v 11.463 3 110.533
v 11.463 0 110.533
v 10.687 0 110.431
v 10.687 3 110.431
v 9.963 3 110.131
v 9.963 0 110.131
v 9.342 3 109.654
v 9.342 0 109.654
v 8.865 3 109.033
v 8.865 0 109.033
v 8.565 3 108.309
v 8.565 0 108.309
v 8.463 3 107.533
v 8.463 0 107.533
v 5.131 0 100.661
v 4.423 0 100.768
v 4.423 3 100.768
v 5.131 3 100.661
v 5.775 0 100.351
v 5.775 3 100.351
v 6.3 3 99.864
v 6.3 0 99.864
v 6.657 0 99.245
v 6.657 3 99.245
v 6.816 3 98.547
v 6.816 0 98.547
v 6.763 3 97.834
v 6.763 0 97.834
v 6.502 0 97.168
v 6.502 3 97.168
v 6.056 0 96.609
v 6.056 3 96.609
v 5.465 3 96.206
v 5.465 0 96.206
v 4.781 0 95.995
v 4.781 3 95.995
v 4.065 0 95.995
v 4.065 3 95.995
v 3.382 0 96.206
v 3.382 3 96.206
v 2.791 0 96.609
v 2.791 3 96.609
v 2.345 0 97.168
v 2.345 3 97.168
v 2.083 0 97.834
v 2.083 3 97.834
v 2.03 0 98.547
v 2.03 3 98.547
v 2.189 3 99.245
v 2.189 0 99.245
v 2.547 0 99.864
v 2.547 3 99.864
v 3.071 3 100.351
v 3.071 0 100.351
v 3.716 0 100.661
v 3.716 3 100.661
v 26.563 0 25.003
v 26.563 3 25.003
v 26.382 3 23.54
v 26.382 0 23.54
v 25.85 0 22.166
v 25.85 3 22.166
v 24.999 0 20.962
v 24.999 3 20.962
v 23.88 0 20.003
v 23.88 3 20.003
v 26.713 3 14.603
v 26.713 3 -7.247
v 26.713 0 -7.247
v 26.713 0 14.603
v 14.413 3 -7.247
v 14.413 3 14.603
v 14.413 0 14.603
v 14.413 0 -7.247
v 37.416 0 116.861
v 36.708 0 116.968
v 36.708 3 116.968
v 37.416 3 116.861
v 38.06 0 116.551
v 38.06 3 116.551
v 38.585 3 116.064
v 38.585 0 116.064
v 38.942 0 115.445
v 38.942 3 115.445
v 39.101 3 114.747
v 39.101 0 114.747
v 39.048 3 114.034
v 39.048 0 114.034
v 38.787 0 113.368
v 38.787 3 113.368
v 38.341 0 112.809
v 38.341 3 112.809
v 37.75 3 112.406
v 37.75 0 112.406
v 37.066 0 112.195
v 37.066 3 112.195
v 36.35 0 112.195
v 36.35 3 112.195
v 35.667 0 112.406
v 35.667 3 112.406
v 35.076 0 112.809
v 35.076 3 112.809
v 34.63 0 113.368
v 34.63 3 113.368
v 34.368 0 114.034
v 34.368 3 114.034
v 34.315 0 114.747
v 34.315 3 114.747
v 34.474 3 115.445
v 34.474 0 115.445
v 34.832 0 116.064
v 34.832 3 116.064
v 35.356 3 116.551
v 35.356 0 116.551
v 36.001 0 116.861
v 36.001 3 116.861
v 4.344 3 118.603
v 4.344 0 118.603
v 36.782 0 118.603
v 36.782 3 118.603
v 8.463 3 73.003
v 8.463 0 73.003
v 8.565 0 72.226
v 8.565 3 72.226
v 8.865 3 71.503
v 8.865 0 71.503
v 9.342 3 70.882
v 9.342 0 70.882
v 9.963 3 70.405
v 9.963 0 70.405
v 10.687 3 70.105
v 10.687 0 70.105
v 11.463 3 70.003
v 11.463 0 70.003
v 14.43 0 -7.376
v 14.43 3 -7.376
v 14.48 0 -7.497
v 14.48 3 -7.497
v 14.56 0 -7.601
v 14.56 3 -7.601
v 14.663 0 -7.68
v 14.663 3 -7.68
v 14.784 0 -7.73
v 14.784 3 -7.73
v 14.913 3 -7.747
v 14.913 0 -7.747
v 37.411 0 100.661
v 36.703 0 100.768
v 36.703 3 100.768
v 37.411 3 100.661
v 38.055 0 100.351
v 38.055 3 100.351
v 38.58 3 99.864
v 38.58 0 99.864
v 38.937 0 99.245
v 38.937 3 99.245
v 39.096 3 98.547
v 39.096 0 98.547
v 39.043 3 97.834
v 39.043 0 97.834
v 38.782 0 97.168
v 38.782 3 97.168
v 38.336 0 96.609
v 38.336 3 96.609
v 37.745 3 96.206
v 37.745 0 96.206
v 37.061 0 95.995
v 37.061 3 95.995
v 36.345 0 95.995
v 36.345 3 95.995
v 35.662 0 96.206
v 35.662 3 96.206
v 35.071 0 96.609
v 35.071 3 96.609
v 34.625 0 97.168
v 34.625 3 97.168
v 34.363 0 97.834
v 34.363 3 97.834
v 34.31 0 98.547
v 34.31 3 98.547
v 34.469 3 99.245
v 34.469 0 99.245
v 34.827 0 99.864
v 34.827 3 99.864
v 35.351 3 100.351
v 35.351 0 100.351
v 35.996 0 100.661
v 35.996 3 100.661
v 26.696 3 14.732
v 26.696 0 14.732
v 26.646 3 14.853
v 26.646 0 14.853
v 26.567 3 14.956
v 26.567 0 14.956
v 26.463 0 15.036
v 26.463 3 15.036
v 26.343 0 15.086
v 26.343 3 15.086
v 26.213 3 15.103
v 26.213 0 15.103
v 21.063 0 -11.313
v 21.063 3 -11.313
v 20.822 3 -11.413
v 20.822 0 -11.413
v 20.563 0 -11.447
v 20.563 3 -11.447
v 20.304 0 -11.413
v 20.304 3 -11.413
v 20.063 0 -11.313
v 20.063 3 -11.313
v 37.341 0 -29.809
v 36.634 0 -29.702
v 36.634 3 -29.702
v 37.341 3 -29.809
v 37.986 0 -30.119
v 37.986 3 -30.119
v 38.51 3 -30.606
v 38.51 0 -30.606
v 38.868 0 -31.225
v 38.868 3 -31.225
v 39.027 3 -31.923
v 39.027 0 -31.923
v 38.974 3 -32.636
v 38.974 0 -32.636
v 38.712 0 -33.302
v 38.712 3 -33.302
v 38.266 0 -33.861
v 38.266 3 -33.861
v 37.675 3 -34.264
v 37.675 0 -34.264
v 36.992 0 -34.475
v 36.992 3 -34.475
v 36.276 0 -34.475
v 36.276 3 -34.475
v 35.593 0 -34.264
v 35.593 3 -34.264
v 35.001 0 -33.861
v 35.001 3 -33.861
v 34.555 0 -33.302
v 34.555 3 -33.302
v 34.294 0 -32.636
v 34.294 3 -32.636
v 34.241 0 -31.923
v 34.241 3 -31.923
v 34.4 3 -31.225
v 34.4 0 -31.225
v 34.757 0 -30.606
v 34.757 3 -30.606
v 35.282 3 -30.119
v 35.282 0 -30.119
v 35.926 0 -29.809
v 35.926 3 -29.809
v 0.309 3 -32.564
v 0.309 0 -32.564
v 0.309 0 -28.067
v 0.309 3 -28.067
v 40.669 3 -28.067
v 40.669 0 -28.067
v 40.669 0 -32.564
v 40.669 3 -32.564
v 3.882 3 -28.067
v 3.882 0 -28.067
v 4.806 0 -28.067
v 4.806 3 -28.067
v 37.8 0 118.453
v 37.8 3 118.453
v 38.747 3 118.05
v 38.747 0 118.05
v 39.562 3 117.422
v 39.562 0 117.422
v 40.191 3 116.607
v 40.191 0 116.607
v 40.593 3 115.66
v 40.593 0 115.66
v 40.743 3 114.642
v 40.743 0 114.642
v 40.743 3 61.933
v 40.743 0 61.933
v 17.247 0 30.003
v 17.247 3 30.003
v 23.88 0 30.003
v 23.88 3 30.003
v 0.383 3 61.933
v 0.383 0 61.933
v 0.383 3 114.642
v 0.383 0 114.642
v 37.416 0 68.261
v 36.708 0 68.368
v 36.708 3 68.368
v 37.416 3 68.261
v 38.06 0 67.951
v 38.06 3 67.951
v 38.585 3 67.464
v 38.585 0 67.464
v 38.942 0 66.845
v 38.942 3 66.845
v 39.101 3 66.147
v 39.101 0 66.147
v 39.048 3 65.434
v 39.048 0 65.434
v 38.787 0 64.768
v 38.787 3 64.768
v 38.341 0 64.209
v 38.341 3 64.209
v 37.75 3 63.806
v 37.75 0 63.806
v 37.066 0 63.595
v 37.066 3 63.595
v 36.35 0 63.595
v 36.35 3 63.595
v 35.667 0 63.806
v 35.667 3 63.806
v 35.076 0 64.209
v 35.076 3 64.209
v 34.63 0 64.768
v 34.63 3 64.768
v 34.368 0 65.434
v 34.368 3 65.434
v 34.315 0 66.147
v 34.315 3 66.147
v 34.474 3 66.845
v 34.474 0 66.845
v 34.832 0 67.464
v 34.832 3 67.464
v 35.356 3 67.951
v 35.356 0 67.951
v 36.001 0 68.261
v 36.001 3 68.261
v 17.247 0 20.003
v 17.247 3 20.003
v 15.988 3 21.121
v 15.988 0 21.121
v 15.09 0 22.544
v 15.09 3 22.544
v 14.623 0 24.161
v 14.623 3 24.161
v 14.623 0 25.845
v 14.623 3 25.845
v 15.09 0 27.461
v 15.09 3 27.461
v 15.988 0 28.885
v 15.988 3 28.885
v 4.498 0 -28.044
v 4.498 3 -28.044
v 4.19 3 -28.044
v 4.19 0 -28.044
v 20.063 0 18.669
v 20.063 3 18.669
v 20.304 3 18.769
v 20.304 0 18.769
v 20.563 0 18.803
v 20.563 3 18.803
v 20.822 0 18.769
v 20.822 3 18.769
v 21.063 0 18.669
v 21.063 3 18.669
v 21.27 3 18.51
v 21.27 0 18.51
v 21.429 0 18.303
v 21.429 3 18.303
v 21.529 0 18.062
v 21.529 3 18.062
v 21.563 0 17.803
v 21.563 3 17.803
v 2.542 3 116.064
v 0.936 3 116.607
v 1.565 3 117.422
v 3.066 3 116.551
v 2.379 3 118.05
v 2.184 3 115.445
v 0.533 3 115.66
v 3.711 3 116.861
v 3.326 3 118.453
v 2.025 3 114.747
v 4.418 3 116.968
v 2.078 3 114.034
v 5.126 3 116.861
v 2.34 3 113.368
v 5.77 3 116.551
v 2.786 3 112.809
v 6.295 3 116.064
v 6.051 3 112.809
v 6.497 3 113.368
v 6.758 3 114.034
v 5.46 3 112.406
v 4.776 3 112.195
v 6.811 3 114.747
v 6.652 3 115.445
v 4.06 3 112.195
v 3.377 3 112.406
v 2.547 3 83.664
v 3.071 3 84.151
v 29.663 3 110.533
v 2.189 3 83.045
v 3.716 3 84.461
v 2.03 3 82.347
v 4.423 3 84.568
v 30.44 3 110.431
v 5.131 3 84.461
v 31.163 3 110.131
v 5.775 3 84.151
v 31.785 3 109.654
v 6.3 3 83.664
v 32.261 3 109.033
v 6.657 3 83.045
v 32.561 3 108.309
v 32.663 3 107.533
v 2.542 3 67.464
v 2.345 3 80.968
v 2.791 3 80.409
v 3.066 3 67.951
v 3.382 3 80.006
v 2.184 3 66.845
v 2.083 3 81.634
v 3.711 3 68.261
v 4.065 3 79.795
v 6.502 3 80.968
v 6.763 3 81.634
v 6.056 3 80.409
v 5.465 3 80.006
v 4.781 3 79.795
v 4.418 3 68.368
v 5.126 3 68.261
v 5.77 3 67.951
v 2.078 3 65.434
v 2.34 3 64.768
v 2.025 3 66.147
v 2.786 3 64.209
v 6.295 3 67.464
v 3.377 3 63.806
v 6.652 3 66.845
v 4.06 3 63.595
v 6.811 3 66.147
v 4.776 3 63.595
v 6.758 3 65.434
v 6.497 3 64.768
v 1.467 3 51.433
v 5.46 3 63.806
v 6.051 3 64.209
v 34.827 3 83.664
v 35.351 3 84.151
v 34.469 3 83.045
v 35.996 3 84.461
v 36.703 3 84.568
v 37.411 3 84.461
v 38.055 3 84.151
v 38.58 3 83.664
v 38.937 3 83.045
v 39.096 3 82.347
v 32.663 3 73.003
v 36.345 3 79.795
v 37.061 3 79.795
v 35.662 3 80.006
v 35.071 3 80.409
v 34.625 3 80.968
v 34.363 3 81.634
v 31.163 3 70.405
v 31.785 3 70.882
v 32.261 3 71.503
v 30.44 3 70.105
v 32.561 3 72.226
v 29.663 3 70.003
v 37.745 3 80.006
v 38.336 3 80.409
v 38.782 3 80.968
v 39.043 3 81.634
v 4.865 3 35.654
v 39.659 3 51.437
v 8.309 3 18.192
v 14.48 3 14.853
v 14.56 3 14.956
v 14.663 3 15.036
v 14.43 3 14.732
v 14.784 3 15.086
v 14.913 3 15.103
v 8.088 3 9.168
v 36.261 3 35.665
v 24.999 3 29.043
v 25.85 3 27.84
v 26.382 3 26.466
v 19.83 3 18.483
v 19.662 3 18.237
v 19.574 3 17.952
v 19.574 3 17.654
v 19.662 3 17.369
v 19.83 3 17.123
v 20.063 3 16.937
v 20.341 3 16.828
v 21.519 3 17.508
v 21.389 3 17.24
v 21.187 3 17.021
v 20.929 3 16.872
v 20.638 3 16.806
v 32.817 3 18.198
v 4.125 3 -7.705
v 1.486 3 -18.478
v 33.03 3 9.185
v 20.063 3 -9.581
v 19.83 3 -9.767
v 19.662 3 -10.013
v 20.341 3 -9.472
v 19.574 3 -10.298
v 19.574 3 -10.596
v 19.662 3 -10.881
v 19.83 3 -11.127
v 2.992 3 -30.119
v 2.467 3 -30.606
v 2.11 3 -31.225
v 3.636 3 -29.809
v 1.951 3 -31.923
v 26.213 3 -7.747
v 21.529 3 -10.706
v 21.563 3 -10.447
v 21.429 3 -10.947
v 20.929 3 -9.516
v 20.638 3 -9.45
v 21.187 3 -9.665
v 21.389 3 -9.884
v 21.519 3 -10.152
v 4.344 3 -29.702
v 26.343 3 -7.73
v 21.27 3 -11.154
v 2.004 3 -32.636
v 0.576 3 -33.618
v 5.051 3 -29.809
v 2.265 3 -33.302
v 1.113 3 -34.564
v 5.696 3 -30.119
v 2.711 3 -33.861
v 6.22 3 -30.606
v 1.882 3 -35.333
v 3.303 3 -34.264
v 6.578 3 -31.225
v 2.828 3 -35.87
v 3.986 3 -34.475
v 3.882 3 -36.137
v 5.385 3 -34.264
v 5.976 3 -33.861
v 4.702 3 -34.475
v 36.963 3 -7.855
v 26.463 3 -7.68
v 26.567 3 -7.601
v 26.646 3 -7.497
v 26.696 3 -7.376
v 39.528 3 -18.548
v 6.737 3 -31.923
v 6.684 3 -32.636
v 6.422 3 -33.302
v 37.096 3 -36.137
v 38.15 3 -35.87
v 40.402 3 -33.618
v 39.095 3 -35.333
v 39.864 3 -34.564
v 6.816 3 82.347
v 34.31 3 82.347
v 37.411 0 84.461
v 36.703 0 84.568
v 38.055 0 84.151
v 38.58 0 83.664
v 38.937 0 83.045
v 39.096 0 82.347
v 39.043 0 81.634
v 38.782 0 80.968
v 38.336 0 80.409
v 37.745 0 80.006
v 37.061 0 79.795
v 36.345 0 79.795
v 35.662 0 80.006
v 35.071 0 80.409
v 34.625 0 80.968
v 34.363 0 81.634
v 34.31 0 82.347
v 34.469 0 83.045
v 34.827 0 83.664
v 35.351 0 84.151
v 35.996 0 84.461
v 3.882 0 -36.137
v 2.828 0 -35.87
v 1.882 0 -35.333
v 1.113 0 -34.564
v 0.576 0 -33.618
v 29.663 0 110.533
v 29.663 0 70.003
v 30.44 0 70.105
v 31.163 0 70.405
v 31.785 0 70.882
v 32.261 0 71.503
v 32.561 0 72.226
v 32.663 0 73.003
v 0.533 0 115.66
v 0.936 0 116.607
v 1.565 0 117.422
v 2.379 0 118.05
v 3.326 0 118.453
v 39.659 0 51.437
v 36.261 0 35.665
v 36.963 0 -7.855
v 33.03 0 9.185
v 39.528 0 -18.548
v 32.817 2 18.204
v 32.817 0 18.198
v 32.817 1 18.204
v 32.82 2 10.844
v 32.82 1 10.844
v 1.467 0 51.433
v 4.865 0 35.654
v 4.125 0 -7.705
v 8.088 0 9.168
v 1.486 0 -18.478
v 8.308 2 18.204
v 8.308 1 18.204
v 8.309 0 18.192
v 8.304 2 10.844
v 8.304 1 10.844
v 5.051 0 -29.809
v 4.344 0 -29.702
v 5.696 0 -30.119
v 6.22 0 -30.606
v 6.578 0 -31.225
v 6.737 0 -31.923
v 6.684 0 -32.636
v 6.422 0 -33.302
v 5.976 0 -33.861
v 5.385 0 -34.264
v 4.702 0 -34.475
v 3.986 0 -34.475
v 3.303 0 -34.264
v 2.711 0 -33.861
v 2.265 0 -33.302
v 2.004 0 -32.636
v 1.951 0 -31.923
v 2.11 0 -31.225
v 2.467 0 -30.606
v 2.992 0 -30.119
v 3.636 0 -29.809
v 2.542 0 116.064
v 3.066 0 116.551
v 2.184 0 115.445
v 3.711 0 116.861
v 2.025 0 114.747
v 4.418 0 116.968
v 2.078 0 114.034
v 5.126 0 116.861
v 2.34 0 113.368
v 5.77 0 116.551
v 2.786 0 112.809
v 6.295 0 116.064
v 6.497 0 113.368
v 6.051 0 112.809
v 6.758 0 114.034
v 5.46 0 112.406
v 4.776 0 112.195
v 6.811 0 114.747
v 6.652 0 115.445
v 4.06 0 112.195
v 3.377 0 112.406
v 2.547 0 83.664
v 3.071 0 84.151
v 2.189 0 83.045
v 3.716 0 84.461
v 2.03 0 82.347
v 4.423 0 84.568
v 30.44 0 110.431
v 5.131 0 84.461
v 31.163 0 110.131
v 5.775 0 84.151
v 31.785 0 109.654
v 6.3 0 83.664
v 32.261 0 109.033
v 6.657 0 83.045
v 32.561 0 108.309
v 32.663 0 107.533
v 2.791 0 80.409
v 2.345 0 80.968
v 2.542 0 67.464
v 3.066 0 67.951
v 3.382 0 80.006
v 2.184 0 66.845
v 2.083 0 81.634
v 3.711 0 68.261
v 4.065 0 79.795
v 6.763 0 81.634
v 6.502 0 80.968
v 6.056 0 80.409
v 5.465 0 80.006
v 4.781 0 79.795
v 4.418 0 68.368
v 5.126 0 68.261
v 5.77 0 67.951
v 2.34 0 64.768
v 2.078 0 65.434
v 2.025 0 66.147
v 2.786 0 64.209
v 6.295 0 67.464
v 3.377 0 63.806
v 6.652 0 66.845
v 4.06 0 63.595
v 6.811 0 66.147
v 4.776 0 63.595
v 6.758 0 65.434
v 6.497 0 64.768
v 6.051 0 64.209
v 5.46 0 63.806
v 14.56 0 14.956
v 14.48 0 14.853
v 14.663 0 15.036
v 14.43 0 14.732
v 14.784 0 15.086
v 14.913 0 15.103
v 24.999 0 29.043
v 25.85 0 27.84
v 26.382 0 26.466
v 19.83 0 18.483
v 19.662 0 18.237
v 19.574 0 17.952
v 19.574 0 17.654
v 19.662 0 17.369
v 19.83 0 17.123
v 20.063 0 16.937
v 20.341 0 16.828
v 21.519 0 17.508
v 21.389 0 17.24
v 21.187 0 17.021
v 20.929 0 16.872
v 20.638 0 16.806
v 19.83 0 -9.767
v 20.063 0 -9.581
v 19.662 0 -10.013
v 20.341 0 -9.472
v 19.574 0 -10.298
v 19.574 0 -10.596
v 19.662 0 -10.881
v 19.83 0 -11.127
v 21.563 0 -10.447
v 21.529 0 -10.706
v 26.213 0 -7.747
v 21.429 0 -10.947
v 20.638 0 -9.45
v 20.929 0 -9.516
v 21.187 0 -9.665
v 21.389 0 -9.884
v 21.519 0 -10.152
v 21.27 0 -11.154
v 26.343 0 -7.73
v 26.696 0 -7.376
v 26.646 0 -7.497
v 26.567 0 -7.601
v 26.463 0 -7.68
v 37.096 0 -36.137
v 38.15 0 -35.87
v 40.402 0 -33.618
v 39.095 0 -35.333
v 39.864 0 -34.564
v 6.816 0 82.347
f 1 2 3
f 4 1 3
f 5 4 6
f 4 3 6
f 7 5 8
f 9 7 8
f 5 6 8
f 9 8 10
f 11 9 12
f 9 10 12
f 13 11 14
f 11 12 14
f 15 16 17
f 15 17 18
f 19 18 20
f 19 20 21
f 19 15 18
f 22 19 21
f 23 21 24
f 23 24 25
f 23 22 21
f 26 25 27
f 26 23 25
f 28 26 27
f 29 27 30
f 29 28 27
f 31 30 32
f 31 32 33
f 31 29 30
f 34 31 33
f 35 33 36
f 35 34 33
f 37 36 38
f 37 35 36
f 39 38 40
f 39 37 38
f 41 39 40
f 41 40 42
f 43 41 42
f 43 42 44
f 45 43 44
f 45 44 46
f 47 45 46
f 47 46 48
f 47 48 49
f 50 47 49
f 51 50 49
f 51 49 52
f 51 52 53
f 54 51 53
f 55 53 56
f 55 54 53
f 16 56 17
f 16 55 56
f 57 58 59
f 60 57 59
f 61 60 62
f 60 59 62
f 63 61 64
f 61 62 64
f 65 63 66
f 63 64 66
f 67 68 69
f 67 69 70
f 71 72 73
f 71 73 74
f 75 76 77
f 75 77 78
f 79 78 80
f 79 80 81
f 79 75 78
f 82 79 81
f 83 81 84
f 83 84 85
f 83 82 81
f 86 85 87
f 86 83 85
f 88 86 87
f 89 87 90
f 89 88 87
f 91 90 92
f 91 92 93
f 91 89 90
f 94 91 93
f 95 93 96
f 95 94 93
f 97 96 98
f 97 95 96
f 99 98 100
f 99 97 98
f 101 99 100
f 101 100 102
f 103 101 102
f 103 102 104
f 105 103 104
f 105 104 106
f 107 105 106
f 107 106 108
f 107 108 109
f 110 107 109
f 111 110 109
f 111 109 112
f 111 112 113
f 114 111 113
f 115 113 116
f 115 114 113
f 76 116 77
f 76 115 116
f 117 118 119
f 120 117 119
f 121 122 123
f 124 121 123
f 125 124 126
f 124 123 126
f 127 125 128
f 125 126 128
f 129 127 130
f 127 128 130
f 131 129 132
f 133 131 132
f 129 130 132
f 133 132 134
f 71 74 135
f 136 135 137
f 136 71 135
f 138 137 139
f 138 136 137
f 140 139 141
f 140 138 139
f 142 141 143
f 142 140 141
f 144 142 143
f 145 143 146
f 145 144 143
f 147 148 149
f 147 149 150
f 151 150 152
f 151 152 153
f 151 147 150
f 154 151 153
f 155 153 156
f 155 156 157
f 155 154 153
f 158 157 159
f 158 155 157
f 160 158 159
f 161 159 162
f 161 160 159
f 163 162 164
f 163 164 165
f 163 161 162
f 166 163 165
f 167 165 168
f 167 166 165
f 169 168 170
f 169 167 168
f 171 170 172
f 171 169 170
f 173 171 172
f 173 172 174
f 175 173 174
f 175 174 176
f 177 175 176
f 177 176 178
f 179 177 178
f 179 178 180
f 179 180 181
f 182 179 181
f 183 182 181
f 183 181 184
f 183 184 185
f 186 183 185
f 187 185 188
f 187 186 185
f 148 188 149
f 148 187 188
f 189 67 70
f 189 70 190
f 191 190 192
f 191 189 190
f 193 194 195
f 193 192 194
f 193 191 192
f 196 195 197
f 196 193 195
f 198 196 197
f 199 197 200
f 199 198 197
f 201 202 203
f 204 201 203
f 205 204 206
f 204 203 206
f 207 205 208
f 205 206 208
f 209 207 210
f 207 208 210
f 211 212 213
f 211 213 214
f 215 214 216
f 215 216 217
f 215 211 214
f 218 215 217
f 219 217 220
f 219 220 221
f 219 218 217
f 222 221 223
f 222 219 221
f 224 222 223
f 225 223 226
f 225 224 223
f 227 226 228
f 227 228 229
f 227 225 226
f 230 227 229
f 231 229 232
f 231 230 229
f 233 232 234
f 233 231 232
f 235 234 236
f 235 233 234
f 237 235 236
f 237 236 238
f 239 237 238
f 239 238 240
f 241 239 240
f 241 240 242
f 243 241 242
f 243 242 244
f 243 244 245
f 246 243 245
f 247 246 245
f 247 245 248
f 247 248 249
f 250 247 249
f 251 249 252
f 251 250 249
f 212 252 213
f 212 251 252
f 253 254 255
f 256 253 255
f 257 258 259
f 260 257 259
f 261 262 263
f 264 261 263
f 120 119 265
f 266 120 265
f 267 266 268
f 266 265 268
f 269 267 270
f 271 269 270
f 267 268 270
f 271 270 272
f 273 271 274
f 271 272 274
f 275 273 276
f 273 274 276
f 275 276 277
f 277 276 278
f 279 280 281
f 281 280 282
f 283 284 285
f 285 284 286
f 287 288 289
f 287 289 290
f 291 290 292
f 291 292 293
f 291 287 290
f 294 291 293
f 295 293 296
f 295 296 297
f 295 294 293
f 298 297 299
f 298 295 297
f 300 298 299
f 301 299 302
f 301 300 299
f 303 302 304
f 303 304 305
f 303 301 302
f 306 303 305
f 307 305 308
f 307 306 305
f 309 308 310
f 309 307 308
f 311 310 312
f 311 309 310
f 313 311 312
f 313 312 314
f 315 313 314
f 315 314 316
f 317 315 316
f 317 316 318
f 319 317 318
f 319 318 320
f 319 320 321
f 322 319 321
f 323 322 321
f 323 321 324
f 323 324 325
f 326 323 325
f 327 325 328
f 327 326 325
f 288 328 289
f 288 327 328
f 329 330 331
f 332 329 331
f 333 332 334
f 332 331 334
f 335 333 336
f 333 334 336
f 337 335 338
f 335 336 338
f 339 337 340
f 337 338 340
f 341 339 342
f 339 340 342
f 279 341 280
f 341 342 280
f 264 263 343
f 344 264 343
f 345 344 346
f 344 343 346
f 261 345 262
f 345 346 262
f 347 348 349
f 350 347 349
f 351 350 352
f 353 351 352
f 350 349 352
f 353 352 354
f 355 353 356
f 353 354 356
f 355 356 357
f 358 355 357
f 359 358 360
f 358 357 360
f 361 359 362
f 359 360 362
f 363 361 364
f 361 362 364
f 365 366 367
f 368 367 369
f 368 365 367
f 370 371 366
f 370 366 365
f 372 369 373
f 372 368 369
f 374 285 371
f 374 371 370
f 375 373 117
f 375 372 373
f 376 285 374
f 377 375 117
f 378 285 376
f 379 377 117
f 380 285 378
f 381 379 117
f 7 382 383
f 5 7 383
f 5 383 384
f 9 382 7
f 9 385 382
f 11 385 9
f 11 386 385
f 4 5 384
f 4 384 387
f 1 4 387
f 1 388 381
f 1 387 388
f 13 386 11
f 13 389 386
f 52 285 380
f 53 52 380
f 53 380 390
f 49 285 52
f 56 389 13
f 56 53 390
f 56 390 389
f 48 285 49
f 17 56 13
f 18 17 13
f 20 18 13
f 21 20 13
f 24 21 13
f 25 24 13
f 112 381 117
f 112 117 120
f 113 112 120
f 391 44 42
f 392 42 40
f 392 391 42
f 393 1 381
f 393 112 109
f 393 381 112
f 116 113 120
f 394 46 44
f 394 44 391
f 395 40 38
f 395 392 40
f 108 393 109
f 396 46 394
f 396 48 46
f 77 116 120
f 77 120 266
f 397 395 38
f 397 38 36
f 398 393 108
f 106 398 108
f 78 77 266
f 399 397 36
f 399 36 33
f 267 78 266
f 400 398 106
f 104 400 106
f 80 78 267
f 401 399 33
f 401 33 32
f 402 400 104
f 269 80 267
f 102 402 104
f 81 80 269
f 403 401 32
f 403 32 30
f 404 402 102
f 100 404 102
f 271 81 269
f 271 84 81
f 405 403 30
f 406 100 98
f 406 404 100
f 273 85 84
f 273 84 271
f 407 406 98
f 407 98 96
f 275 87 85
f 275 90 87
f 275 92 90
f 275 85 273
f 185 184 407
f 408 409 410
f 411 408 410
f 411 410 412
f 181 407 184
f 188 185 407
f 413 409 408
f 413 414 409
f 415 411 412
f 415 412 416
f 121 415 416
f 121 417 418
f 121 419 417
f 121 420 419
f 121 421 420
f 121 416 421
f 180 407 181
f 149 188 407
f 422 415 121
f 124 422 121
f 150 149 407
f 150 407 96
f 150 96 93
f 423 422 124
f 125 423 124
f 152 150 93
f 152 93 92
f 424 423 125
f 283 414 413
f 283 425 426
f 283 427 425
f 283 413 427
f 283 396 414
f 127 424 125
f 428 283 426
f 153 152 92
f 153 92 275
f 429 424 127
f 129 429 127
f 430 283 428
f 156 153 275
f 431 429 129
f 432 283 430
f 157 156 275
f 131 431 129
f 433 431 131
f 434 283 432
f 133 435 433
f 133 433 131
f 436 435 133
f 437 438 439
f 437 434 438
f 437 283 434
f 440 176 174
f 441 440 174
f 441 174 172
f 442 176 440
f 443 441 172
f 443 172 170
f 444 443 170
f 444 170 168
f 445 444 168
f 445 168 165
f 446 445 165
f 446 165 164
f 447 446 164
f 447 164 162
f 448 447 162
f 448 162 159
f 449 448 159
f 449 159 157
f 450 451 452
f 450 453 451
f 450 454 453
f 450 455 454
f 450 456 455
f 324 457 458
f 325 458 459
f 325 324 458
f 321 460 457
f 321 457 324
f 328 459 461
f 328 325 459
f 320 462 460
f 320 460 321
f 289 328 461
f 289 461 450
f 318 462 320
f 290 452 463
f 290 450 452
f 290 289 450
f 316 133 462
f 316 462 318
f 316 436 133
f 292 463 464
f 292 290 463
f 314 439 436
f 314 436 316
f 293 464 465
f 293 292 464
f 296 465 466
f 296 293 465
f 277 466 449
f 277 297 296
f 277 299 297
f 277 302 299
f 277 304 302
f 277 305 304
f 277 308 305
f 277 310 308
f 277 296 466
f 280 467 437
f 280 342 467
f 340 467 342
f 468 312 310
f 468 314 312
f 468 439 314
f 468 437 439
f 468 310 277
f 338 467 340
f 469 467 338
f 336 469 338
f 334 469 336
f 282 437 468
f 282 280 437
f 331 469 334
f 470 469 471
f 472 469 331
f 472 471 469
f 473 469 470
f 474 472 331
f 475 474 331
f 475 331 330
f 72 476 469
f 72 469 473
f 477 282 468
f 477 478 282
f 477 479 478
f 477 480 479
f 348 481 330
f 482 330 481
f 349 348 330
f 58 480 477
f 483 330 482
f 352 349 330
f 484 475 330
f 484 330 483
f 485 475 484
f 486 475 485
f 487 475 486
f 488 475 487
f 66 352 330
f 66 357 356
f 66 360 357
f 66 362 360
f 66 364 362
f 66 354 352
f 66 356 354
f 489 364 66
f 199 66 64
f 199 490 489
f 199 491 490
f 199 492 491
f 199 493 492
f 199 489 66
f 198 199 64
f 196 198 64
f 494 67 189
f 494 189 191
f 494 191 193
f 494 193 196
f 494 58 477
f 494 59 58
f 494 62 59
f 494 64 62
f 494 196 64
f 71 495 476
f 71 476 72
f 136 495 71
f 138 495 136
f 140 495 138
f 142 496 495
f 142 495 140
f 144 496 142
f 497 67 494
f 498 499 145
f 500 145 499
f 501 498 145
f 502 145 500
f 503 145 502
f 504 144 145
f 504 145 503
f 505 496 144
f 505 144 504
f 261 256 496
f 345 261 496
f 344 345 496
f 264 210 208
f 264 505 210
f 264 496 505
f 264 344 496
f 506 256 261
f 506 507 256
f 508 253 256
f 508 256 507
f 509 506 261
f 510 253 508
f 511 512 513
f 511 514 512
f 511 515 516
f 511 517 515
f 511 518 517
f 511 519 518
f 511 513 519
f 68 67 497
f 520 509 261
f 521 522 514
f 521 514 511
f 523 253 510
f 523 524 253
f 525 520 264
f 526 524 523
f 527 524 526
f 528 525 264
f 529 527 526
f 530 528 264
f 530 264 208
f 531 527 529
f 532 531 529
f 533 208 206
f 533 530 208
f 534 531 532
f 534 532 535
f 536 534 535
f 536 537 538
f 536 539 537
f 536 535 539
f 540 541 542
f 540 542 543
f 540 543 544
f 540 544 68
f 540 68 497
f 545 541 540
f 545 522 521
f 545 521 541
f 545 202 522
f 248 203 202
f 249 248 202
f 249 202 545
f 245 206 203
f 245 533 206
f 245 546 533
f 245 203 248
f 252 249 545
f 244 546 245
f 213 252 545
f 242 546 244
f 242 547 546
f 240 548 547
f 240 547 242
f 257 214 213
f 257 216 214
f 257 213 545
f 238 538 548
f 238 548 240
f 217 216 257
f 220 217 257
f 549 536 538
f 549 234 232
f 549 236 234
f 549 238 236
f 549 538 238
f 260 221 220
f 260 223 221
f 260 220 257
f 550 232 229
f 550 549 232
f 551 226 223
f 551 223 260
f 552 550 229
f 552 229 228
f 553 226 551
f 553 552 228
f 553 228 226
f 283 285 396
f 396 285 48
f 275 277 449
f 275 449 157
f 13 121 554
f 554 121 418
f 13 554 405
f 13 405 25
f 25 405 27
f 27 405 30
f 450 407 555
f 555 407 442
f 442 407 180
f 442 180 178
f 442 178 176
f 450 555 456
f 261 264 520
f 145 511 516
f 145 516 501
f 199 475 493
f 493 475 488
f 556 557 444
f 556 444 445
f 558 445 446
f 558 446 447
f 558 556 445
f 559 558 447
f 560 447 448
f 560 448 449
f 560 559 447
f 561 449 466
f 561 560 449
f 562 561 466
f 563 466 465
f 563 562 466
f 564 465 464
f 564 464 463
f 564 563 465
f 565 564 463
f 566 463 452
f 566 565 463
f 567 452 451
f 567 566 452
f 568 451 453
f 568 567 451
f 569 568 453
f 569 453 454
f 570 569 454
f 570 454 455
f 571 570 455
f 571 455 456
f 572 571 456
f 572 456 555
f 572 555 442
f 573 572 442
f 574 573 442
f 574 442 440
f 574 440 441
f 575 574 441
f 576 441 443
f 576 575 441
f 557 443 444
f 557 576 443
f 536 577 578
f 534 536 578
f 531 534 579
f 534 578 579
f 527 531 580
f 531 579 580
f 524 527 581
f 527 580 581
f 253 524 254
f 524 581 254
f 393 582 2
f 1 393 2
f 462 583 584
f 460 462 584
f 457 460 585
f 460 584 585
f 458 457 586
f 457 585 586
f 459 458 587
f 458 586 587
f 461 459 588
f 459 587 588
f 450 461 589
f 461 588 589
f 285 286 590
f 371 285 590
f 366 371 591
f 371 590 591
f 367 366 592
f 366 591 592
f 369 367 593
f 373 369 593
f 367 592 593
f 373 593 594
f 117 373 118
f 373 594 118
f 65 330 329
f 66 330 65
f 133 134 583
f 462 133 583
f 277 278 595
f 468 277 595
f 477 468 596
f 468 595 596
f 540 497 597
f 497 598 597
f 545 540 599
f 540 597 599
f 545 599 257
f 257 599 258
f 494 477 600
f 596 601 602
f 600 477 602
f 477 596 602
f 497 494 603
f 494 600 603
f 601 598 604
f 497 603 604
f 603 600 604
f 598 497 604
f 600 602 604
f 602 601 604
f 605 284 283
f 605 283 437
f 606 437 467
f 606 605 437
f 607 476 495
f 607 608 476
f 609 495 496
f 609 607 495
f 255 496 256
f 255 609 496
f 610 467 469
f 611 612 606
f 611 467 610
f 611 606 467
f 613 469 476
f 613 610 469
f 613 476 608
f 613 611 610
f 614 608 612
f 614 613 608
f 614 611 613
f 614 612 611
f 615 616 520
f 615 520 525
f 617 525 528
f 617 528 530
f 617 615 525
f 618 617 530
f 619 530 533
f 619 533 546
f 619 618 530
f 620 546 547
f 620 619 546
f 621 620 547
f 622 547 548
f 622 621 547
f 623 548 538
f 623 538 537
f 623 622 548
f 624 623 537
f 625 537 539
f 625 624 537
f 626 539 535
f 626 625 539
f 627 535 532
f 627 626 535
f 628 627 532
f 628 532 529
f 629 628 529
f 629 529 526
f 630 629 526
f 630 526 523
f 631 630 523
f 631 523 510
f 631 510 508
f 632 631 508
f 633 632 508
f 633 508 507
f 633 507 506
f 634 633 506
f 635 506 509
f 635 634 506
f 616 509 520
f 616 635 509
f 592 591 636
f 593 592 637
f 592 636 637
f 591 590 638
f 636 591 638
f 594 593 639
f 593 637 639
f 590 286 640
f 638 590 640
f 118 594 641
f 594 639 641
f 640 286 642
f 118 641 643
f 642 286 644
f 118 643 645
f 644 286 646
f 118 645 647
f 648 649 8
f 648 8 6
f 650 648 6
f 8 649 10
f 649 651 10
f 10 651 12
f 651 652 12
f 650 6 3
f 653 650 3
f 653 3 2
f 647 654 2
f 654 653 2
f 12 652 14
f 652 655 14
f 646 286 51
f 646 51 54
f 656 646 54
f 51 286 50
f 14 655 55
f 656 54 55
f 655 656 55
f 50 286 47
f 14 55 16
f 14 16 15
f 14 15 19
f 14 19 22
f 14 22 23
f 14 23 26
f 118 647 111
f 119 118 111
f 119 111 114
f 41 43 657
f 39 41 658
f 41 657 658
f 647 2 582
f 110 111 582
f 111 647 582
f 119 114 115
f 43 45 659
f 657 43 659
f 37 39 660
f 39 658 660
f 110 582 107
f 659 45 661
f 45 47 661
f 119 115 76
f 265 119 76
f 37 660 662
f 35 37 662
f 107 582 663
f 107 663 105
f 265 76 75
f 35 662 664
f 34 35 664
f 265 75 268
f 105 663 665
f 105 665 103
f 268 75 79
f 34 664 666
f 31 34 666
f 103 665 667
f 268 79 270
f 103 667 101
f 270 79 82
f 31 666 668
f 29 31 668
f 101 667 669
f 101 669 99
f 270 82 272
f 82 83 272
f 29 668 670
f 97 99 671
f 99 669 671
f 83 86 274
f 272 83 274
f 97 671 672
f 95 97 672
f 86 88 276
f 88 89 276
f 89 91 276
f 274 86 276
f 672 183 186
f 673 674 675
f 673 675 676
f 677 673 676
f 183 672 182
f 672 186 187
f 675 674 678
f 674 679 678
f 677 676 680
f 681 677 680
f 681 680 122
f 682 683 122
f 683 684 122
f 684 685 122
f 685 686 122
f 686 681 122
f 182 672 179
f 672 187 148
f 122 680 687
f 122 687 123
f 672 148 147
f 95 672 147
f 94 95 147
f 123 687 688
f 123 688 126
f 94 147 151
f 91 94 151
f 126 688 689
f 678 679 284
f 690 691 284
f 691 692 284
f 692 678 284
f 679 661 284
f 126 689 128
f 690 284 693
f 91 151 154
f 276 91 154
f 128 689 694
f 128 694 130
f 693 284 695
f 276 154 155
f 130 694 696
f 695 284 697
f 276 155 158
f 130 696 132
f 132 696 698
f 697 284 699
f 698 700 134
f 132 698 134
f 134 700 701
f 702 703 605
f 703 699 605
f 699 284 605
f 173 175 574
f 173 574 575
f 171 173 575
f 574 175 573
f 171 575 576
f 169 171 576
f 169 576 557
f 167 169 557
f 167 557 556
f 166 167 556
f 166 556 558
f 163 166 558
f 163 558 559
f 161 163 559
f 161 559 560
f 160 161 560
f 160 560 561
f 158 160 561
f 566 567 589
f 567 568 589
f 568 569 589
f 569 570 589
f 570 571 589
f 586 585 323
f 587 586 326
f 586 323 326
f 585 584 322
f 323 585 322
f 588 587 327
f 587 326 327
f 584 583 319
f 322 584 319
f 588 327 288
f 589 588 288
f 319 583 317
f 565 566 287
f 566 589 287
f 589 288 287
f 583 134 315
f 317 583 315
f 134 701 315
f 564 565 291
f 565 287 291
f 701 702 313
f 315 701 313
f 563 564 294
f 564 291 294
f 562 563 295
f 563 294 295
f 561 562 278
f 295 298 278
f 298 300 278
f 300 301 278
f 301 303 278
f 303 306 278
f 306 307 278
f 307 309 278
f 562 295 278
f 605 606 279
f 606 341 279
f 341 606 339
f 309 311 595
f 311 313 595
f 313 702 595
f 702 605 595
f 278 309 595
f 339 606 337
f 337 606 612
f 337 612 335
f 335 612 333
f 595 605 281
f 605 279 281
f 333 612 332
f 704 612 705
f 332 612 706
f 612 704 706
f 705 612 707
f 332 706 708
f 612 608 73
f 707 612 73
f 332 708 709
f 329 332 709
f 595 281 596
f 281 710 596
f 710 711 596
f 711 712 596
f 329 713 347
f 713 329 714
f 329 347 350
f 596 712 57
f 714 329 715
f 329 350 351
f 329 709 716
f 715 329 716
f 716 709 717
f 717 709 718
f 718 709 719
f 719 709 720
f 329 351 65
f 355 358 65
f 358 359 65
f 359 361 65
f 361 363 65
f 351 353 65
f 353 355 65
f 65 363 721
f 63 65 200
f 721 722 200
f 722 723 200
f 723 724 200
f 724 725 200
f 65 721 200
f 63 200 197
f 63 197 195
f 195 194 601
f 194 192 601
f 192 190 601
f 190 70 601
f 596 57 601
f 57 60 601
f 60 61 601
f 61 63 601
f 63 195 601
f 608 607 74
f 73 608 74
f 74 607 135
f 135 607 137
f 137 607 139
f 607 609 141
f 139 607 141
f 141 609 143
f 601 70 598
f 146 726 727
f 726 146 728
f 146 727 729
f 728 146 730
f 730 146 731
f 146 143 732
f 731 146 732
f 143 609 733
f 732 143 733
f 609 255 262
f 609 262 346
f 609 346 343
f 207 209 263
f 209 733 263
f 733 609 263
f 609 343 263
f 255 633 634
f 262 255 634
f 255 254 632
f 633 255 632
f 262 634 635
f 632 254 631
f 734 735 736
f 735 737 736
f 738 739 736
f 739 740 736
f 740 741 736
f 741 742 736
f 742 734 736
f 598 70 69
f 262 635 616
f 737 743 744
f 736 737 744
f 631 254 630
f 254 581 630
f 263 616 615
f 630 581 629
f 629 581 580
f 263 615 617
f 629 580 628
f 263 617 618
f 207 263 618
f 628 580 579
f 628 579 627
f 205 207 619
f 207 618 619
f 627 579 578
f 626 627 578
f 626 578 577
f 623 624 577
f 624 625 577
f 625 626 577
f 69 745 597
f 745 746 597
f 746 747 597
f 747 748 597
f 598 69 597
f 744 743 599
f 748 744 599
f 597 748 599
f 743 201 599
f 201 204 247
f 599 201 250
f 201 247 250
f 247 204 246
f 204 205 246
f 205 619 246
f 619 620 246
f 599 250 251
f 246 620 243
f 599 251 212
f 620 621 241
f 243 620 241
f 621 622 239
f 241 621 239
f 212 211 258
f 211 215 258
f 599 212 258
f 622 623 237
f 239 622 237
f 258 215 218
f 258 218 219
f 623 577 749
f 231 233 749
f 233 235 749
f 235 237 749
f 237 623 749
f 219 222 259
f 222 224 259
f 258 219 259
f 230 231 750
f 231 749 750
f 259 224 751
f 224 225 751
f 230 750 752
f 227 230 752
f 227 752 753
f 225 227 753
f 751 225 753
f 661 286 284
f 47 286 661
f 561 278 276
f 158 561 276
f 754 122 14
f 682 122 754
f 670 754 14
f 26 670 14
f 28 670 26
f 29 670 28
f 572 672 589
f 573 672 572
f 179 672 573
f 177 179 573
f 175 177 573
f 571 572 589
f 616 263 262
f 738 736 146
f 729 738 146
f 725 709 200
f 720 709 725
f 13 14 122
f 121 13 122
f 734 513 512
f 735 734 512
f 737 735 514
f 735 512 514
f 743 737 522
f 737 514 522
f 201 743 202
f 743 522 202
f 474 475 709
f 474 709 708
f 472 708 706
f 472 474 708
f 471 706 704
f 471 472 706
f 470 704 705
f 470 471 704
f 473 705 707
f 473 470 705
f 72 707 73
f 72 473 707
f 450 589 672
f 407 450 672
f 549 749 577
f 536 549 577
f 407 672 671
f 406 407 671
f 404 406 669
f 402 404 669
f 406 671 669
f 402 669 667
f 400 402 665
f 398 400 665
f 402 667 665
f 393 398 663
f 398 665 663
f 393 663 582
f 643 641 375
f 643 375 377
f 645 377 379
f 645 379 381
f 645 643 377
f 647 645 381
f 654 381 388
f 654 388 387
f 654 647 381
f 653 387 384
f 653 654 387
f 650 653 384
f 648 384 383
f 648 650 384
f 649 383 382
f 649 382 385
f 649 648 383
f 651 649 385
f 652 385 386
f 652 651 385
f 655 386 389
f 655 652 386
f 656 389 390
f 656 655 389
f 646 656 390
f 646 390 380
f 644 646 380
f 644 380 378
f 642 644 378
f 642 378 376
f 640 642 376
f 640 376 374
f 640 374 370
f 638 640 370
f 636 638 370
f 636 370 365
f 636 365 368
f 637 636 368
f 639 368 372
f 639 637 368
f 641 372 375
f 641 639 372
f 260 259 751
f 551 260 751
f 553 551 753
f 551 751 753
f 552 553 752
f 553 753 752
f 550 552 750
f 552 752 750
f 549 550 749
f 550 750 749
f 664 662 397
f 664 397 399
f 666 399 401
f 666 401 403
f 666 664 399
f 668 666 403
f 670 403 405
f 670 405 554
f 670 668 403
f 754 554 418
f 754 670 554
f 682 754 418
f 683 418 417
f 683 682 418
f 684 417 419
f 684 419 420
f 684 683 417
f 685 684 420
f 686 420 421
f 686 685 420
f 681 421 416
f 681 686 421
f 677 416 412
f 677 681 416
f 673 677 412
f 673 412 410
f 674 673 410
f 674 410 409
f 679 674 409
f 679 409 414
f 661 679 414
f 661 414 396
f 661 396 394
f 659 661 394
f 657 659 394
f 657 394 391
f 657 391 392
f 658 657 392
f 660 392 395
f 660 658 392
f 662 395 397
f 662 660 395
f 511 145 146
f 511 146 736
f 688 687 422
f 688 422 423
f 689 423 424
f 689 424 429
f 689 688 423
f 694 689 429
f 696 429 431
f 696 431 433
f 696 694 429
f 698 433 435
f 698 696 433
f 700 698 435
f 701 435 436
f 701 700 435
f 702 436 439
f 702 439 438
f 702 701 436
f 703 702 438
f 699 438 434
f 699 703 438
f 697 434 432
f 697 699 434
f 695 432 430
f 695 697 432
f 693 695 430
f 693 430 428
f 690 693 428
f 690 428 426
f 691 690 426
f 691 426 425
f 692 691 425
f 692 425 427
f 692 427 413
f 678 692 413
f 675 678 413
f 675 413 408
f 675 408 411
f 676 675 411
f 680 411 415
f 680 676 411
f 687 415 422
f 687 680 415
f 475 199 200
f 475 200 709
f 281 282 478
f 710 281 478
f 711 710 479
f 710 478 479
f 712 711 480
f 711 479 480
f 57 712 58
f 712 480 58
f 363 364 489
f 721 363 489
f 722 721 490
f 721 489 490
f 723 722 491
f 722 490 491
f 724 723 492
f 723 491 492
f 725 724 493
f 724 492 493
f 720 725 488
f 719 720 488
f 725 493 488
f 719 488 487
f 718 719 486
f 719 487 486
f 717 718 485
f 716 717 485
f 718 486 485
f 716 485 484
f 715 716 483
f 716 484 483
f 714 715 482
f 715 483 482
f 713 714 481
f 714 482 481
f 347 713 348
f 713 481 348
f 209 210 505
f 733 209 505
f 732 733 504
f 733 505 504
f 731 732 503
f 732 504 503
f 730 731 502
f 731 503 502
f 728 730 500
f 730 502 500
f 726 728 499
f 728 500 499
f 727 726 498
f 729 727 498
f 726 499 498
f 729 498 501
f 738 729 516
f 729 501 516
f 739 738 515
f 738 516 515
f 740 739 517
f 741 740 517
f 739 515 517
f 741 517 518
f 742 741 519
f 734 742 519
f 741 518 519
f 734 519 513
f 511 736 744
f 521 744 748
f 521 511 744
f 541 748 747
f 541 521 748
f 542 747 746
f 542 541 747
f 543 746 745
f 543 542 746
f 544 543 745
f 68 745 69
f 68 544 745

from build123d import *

# Parameters (mm, degrees)
SKETCH2_R           = 2.4
BOSS_EXTRUDE1_DEPTH = 3
CUT_EXTRUDE1_DEPTH  = 10
SKETCH4_W           = 6.633249581
SKETCH4_H           = 10
CUT_EXTRUDE2_DEPTH  = 10


with BuildPart() as part:
    # Sketch2 → Boss-Extrude1 (new body)
    with BuildSketch(Plane(origin=(0, 0, 0), x_dir=(1, 0, 0), z_dir=(0, 1, 0))):
        with BuildLine():
            Line((37.095668531, 36.137061002), (3.882090118, 36.137061002))
            ThreePointArc((3.882090118, 36.137061002), (1.472078995, 34.973861332), (0.308879325, 32.563850209))
            Line((0.308879325, 32.563850209), (0.308879325, 28.067061002))
            add(Edge.make_bspline(
                [(0.383185823, -61.932938998), (0.383185823, -49.55331966), (8.593306341, -25.568302829), (8.562984639, -3.223049243), (0.308879325, 17.163416192), (0.308879325, 28.067061002)],
                knots=[0, 0, 0, 0, 0.447162615, 0.547162615, 1, 1, 1, 1], degree=3))
            Line((0.383185823, -61.932938998), (0.383185823, -114.493630956))
            Line((0.383185823, -114.493630956), (0.383185823, -114.642243953))
            ThreePointArc((0.383185823, -114.642243953), (1.564526203, -117.421597075), (4.343879325, -118.602937455))
            Line((4.343879325, -118.602937455), (36.782492321, -118.602937455))
            ThreePointArc((36.782492321, -118.602937455), (39.561845443, -117.421597075), (40.743185823, -114.642243953))
            Line((40.743185823, -114.642243953), (40.743185823, -114.493630956))
            Line((40.743185823, -114.493630956), (40.743185823, -61.932938998))
            add(Edge.make_bspline(
                [(40.743185823, -61.932938998), (40.743185823, -49.55331966), (32.526457787, -25.568302829), (32.571301302, -3.223049243), (40.668879325, 17.163416192), (40.668879325, 28.067061002)],
                knots=[0, 0, 0, 0, 0.447162615, 0.547162615, 1, 1, 1, 1], degree=3))
            Line((40.668879325, 28.067061002), (40.668879325, 32.563850209))
            ThreePointArc((40.668879325, 32.563850209), (39.505679655, 34.973861332), (37.095668531, 36.137061002))
        make_face()
        with BuildLine():
            Line((3.882090118, 28.067061002), (4.805668531, 28.067061002))
            ThreePointArc((4.805668531, 28.067061002), (4.343879325, 28.040722027), (3.882090118, 28.067061002))
        make_face(mode=Mode.SUBTRACT)
        with Locations(Location((4.343879325, 32.102061002, 0), (0, 0, 270))):
            Circle(SKETCH2_R, mode=Mode.SUBTRACT)
        with Locations(Location((36.633879325, 32.102061002, 0), (0, 0, 270))):
            Circle(SKETCH2_R, mode=Mode.SUBTRACT)
        with Locations(Location((4.418185823, -114.567937455, 0), (0, 0, 270))):
            Circle(SKETCH2_R, mode=Mode.SUBTRACT)
        with Locations(Location((4.423185823, -98.367938226, 0), (0, 0, 270))):
            Circle(SKETCH2_R, mode=Mode.SUBTRACT)
        with Locations(Location((36.708185823, -114.567937455, 0), (0, 0, 270))):
            Circle(SKETCH2_R, mode=Mode.SUBTRACT)
        with Locations(Location((36.703185823, -98.367938226, 0), (0, 0, 270))):
            Circle(SKETCH2_R, mode=Mode.SUBTRACT)
        with Locations(Location((4.423185823, -82.167938226, 0), (0, 0, 270))):
            Circle(SKETCH2_R, mode=Mode.SUBTRACT)
        with Locations(Location((4.418185823, -65.967938998, 0), (0, 0, 270))):
            Circle(SKETCH2_R, mode=Mode.SUBTRACT)
        with BuildLine():
            ThreePointArc((8.463185823, -73.002938998), (9.34186548, -70.881618654), (11.463185823, -70.002938998))
            Line((11.463185823, -70.002938998), (29.663185823, -70.002938998))
            ThreePointArc((29.663185823, -70.002938998), (31.784506167, -70.881618654), (32.663185823, -73.002938998))
            Line((32.663185823, -73.002938998), (32.663185823, -107.532937455))
            ThreePointArc((32.663185823, -107.532937455), (31.784506167, -109.654257798), (29.663185823, -110.532937455))
            Line((29.663185823, -110.532937455), (11.463185823, -110.532937455))
            ThreePointArc((11.463185823, -110.532937455), (9.34186548, -109.654257798), (8.463185823, -107.532937455))
            Line((8.463185823, -107.532937455), (8.463185823, -73.002938998))
        make_face(mode=Mode.SUBTRACT)
        with Locations(Location((36.703185823, -82.167938226, 0), (0, 0, 270))):
            Circle(SKETCH2_R, mode=Mode.SUBTRACT)
        with Locations(Location((36.708185823, -65.967938998, 0), (0, 0, 270))):
            Circle(SKETCH2_R, mode=Mode.SUBTRACT)
    extrude(amount=BOSS_EXTRUDE1_DEPTH)

    # Sketch3 → Cut-Extrude1 (cut)
    with BuildSketch(Plane(origin=(0, 3, 0), x_dir=(1, 0, 0), z_dir=(0, 1, 0))):
        with BuildLine():
            ThreePointArc((21.563185823, -17.802938998), (20.063185823, -16.936913594), (20.063185823, -18.668964402))
            ThreePointArc((20.063185823, -18.668964402), (20.563185823, -18.802938998), (21.063185823, -18.668964402))
            ThreePointArc((21.063185823, -18.668964402), (21.429211227, -18.302938998), (21.563185823, -17.802938998))
        make_face()
        with BuildLine():
            ThreePointArc((21.063185823, 11.313086406), (20.563185823, 11.447061002), (20.063185823, 11.313086406))
            ThreePointArc((20.063185823, 11.313086406), (20.063185823, 9.581035598), (21.563185823, 10.447061002))
            ThreePointArc((21.563185823, 10.447061002), (21.429211227, 10.947061002), (21.063185823, 11.313086406))
        make_face()
        with BuildLine():
            Line((14.413185823, -14.602938998), (14.413185823, 7.247061002))
            ThreePointArc((14.413185823, 7.247061002), (14.559632433, 7.600614393), (14.913185823, 7.747061002))
            Line((14.913185823, 7.747061002), (26.213185823, 7.747061002))
            ThreePointArc((26.213185823, 7.747061002), (26.566739214, 7.600614393), (26.713185823, 7.247061002))
            Line((26.713185823, 7.247061002), (26.713185823, -14.602938998))
            ThreePointArc((26.713185823, -14.602938998), (26.566739214, -14.956492388), (26.213185823, -15.102938998))
            Line((26.213185823, -15.102938998), (14.913185823, -15.102938998))
            ThreePointArc((14.913185823, -15.102938998), (14.559632433, -14.956492388), (14.413185823, -14.602938998))
        make_face()
    extrude(amount=-CUT_EXTRUDE1_DEPTH, mode=Mode.SUBTRACT)

    # Sketch4 → Cut-Extrude2 (cut)
    with BuildSketch(Plane(origin=(0, 3, 0), x_dir=(1, 0, 0), z_dir=(0, 1, 0))):
        with Locations((20.563185823, -25.002938998)):
            Rectangle(SKETCH4_W, SKETCH4_H)
        with BuildLine():
            Line((23.879810614, -20.002938998), (23.879810614, -30.002938998))
            ThreePointArc((23.879810614, -30.002938998), (25.849949897, -27.840213329), (26.563185823, -25.002938998))
            ThreePointArc((26.563185823, -25.002938998), (25.849949897, -22.165664667), (23.879810614, -20.002938998))
        make_face()
        with BuildLine():
            ThreePointArc((17.246561033, -20.002938998), (14.563185823, -25.002938998), (17.246561033, -30.002938998))
            Line((17.246561033, -30.002938998), (17.246561033, -20.002938998))
        make_face()
    extrude(amount=-CUT_EXTRUDE2_DEPTH, mode=Mode.SUBTRACT)


solid = part.part
